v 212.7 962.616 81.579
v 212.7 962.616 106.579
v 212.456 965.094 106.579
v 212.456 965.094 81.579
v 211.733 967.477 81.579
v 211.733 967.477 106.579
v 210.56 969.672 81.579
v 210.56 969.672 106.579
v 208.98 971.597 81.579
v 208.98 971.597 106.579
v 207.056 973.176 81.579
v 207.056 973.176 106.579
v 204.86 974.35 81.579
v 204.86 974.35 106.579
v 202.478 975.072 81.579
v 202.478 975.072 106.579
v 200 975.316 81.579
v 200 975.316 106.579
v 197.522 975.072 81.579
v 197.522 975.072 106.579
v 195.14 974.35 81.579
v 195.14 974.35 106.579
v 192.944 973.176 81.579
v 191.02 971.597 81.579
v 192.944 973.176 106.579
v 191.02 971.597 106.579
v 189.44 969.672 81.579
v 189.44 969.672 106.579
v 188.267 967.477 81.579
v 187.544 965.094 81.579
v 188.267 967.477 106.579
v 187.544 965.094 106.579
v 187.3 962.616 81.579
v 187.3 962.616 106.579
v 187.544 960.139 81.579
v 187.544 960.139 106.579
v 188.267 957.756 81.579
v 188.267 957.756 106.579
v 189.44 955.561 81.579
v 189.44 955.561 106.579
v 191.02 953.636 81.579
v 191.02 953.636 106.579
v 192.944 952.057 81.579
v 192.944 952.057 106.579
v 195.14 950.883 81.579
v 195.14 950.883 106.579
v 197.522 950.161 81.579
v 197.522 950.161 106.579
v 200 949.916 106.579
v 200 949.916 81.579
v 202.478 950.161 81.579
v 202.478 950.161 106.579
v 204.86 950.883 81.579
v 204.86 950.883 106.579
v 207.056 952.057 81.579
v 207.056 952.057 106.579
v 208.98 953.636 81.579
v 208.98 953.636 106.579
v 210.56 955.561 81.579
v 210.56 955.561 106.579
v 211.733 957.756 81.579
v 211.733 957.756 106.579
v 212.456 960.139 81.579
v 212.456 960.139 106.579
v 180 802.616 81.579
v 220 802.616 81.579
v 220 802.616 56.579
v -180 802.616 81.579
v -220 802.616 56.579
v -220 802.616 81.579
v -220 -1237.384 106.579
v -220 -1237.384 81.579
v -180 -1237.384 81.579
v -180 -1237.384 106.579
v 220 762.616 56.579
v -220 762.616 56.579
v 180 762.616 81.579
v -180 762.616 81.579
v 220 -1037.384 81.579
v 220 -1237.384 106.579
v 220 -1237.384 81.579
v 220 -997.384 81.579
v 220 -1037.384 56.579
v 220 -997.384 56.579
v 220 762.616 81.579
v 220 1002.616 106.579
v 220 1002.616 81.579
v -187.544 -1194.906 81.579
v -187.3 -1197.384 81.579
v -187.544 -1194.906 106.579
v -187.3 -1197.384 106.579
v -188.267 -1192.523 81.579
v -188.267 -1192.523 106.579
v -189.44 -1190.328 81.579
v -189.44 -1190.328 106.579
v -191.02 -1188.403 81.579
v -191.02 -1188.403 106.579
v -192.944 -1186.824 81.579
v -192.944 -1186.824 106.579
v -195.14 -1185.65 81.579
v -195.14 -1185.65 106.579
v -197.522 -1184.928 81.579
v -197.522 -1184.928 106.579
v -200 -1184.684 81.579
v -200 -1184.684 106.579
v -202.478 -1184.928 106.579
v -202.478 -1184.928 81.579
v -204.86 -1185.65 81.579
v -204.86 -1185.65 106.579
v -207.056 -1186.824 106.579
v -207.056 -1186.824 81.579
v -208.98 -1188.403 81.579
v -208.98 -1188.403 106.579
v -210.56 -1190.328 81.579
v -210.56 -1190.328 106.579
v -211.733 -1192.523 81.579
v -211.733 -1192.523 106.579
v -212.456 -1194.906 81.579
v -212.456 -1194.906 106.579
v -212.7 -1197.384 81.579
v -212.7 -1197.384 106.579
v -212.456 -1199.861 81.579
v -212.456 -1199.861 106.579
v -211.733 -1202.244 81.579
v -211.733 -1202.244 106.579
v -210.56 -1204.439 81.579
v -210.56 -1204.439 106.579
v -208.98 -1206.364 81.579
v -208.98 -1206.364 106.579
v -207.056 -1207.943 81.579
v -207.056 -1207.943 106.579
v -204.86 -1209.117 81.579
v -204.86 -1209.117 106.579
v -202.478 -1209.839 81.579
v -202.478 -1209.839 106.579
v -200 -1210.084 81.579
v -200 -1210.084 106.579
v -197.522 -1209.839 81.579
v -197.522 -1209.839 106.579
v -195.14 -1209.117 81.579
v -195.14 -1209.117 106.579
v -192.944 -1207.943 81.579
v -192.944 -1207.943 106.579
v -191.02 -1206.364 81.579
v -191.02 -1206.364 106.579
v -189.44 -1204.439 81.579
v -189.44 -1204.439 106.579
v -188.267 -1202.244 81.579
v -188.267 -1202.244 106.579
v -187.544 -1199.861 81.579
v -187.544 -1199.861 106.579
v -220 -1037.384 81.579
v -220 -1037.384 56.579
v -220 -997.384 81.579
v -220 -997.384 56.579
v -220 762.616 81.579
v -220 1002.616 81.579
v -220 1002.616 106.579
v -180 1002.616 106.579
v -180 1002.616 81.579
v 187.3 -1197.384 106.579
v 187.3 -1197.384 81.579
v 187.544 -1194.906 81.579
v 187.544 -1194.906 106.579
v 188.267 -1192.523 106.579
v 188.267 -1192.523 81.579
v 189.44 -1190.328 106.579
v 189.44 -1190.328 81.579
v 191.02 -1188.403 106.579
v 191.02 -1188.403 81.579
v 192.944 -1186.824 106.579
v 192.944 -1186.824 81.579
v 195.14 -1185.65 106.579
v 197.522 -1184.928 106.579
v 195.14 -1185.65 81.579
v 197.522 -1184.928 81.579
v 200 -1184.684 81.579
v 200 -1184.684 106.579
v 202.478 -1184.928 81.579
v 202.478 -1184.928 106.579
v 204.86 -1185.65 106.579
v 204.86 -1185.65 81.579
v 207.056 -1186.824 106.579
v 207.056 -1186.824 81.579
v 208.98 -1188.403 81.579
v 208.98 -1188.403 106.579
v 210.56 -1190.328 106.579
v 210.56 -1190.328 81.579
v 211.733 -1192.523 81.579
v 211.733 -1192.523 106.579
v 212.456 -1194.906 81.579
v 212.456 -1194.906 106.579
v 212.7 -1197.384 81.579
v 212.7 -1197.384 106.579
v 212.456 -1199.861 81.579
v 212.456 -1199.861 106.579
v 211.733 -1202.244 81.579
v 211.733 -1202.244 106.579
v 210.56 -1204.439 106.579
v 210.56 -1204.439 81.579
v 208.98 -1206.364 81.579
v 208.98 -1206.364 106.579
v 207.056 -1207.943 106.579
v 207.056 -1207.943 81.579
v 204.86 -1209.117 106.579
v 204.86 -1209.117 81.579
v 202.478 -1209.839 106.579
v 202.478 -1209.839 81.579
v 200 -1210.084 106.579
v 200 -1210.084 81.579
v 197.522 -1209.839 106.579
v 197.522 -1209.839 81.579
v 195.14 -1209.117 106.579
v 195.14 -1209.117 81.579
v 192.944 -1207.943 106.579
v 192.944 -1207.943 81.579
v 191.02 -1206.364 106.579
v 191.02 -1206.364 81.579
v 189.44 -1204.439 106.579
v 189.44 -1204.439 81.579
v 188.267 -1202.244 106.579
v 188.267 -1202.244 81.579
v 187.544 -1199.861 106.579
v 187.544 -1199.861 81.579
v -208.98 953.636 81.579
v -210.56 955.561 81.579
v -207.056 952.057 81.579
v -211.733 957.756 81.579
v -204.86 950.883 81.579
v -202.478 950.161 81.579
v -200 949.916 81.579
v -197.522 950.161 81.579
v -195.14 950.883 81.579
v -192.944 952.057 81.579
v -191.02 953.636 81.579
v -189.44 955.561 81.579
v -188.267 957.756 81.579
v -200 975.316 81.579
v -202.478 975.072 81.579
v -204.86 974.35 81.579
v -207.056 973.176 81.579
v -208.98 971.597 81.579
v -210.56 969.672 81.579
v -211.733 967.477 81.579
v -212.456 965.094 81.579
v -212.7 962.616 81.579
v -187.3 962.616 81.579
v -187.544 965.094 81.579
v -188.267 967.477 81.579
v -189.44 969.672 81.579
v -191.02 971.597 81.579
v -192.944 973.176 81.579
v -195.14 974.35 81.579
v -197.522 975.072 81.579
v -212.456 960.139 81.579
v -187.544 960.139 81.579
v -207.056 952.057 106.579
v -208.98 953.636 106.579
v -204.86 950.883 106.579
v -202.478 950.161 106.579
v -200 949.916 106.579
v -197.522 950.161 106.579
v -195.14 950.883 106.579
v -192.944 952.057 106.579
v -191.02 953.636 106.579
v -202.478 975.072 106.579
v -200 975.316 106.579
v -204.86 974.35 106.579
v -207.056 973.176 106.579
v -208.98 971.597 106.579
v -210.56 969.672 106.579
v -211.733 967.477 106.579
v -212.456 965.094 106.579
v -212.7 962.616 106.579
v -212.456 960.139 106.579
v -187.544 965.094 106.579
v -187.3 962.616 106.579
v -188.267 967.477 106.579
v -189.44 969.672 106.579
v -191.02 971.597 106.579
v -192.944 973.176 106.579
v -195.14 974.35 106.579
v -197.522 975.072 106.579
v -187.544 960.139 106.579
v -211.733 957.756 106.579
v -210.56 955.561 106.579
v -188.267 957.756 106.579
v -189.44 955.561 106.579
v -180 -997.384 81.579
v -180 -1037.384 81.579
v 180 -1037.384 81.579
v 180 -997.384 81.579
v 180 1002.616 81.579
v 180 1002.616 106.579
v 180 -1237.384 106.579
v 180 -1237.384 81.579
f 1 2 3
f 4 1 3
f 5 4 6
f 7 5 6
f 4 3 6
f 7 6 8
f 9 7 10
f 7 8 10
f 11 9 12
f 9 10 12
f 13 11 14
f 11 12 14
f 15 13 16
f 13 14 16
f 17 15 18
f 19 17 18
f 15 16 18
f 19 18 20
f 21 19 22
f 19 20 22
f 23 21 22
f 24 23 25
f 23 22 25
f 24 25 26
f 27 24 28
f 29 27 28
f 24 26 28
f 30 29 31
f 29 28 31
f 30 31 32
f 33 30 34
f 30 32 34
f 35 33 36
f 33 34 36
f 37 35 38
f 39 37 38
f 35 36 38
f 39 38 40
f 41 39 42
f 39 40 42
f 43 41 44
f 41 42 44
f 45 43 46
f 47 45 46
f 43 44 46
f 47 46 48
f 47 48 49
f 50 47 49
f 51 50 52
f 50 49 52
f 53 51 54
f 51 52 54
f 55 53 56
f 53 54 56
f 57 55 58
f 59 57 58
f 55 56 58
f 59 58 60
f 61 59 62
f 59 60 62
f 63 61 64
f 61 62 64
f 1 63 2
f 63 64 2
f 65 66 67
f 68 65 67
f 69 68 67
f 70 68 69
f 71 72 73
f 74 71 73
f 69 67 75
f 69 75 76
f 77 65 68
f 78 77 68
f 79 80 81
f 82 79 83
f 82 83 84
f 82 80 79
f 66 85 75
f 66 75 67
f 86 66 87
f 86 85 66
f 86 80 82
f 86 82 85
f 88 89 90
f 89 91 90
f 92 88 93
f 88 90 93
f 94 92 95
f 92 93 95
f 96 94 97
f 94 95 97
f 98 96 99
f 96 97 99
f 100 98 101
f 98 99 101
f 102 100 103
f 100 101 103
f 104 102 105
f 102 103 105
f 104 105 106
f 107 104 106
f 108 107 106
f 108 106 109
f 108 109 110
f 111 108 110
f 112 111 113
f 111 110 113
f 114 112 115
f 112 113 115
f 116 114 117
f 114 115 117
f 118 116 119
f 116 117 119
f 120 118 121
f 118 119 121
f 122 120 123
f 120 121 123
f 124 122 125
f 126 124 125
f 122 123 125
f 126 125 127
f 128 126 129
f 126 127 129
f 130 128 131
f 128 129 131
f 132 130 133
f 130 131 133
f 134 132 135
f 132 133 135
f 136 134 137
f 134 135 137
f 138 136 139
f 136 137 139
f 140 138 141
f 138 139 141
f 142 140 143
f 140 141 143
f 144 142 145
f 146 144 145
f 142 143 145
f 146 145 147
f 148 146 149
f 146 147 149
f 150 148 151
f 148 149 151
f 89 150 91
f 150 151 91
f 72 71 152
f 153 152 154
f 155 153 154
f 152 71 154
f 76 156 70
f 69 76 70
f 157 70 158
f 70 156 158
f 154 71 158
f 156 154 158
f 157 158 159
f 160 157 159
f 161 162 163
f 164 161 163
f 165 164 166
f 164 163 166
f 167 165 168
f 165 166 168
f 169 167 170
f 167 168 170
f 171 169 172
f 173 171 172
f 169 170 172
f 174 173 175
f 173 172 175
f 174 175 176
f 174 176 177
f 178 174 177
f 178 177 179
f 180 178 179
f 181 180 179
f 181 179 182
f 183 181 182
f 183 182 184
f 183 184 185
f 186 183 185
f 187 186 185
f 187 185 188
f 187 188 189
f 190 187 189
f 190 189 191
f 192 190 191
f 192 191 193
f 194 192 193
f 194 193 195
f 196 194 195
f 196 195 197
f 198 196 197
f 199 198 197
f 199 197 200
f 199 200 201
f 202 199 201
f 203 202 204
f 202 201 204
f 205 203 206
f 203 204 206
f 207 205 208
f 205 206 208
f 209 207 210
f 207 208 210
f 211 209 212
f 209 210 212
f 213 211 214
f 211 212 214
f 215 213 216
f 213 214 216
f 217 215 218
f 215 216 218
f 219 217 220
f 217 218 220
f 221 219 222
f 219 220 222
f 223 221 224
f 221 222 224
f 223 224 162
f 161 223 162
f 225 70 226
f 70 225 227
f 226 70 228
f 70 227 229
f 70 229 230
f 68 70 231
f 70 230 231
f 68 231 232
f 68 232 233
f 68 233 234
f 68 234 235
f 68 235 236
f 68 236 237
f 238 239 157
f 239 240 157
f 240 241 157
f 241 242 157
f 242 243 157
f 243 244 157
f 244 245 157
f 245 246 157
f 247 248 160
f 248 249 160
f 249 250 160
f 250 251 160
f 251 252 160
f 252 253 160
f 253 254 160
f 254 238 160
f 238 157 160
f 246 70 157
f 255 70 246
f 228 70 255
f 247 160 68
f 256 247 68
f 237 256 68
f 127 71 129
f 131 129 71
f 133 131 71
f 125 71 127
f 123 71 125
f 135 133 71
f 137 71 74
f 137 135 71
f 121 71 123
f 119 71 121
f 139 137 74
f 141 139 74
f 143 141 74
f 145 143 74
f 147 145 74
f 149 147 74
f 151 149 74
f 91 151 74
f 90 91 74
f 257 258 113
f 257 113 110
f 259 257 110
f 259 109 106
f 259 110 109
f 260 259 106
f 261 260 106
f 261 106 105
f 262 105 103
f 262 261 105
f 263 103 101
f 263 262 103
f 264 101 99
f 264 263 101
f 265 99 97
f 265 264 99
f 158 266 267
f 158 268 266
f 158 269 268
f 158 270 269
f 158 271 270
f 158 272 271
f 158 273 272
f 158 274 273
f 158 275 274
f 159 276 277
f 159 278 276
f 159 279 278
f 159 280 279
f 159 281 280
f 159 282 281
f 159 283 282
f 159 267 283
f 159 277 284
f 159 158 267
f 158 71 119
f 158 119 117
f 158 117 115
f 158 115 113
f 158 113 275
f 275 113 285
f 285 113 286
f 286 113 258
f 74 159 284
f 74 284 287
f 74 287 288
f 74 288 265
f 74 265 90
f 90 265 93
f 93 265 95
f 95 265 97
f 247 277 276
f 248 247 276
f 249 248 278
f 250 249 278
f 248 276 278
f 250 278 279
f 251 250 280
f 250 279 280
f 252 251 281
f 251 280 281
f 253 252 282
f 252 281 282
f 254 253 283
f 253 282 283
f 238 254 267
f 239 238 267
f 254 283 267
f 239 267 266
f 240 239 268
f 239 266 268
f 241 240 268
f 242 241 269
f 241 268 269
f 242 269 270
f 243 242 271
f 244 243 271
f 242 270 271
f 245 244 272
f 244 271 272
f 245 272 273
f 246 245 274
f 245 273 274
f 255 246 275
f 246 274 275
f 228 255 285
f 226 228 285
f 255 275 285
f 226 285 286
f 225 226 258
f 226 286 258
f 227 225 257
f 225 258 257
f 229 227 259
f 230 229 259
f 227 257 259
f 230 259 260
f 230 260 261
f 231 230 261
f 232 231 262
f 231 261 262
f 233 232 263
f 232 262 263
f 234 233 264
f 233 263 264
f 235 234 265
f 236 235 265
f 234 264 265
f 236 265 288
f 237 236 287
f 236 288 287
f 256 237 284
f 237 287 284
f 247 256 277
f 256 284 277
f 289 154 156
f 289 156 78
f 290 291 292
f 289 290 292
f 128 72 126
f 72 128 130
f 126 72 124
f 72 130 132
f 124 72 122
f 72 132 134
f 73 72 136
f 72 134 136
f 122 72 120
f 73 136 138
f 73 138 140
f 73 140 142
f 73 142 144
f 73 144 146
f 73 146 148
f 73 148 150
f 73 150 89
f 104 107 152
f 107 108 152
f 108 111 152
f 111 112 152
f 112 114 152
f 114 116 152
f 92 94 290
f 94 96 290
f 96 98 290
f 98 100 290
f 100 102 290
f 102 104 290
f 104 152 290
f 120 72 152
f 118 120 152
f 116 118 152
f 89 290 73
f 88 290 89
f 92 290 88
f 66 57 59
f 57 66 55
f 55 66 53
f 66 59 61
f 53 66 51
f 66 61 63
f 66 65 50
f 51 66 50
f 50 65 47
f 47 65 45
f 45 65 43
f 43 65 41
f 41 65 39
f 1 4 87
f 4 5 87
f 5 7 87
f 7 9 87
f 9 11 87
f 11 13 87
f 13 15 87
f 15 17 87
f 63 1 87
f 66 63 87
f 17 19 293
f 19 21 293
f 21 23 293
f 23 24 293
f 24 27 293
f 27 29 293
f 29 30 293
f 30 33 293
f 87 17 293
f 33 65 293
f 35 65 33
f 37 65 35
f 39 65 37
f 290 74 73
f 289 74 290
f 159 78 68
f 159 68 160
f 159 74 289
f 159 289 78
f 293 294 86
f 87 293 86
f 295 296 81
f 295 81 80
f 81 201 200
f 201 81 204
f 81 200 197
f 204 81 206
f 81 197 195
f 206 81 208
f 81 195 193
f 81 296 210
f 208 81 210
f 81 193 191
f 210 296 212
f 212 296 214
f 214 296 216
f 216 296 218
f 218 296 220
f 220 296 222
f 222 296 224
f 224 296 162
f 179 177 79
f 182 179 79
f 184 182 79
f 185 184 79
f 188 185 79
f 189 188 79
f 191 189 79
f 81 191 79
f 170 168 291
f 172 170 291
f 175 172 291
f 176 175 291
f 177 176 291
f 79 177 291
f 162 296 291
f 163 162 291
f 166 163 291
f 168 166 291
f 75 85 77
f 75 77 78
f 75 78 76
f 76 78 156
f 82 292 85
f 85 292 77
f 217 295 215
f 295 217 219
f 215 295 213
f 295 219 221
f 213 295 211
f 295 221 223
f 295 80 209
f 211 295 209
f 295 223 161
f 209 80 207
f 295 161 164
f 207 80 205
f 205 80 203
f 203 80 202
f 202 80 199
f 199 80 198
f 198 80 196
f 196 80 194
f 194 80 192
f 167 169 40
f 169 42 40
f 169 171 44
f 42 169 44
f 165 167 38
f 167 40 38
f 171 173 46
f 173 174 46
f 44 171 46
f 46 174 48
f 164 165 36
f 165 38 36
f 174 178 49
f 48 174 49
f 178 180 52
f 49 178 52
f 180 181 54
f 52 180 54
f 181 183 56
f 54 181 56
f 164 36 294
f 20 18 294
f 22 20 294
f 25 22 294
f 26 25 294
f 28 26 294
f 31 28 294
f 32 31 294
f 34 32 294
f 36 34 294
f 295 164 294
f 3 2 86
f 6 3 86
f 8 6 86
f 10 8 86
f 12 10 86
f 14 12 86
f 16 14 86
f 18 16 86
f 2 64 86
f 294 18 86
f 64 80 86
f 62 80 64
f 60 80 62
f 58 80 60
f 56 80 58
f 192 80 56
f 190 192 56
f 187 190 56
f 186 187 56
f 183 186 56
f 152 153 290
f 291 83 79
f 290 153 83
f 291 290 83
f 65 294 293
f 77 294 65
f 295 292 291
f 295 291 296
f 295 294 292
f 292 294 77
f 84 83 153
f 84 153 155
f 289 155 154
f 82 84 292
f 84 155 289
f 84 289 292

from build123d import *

# Parameters (mm, degrees)
SKETCH1_W            = 510
SKETCH1_H            = 80
BOSS_EXTRUDE1_DEPTH  = 10
SKETCH2_W            = 70
SKETCH2_H            = 390
CUT_EXTRUDE1_DEPTH   = 11
SKETCH3_W            = 70
SKETCH3_H            = 50
CUT_EXTRUDE2_DEPTH   = 11
SKETCH4_W            = 70
SKETCH4_H            = 10
BOSS_EXTRUDE2_DEPTH  = 100
SKETCH5_W            = 70
SKETCH5_H            = 50
CUT_EXTRUDE3_DEPTH   = 11
SKETCH6_W            = 70
SKETCH6_H            = 10
BOSS_EXTRUDE3_DEPTH  = 100
SKETCH7_W            = 10
SKETCH7_H            = 460
BOSS_EXTRUDE4_DEPTH  = 10
SKETCH8_W            = 10
SKETCH8_H            = 10
BOSS_EXTRUDE5_DEPTH  = 50
SKETCH9_W            = 90
SKETCH9_H            = 60
CUT_EXTRUDE4_DEPTH   = 61
SKETCH10_W           = 90
SKETCH10_H           = 60
CUT_EXTRUDE5_DEPTH   = 61
HOLE1_D              = 6.35
HOLE1_DEPTH          = 10
HOLE2_D              = 6.35
HOLE2_DEPTH          = 80
SCALE1_SCALE         = 4
SKETCH16_W           = 420.354500644
SKETCH16_H           = 2047.440969125
SKETCH16_W_2         = 504.269615058
SKETCH16_H_2         = 2143.883100275
CUT_EXTRUDE6_DEPTH   = 600
SKETCH17_W           = 706.747089412
SKETCH17_H           = 1090.886123918
CUT_EXTRUDE7_DEPTH   = 100
SKETCH18_W           = 40
SKETCH18_H           = 25
BOSS_EXTRUDE6_DEPTH  = 1
SKETCH20_W           = 40
SKETCH20_H           = 1219
SKETCH20_R           = 12.7
BOSS_EXTRUDE9_DEPTH  = 25
SKETCH21_W           = 440
SKETCH21_H           = 40
BOSS_EXTRUDE10_DEPTH = 25


with BuildPart() as part:
    # Sketch1 → Boss-Extrude1 (new body)
    with BuildSketch(Plane(origin=(45, 0, 0), x_dir=(0, -1, 0), z_dir=(-1, 0, 0))):
        with Locations((217.383525535, 40)):
            Rectangle(SKETCH1_W, SKETCH1_H)
    extrude(amount=-BOSS_EXTRUDE1_DEPTH)

    # Sketch2 → Cut-Extrude1 (cut, through all)
    with BuildSketch(Plane.ZY.offset(-45)):
        with Locations((35, -217.383525535)):
            Rectangle(SKETCH2_W, SKETCH2_H)
    extrude(amount=-CUT_EXTRUDE1_DEPTH, mode=Mode.SUBTRACT)

    # Sketch3 → Cut-Extrude2 (cut, through all)
    with BuildSketch(Plane.ZY.offset(-45)):
        with Locations((35, 12.616474465)):
            Rectangle(SKETCH3_W, SKETCH3_H)
    extrude(amount=-CUT_EXTRUDE2_DEPTH, mode=Mode.SUBTRACT)

    # Sketch4 → Boss-Extrude2 (add)
    with BuildSketch(Plane.ZY.offset(-45)):
        with Locations((35, -17.383525535)):
            Rectangle(SKETCH4_W, SKETCH4_H)
    extrude(amount=BOSS_EXTRUDE2_DEPTH)

    # Sketch5 → Cut-Extrude3 (cut, through all)
    with BuildSketch(Plane.ZY.offset(-45)):
        with Locations((35, -447.383525535)):
            Rectangle(SKETCH5_W, SKETCH5_H)
    extrude(amount=-CUT_EXTRUDE3_DEPTH, mode=Mode.SUBTRACT)

    # Sketch6 → Boss-Extrude3 (add)
    with BuildSketch(Plane.ZY.offset(-45)):
        with Locations((35, -417.383525535)):
            Rectangle(SKETCH6_W, SKETCH6_H)
    extrude(amount=BOSS_EXTRUDE3_DEPTH)

    # Sketch7 → Boss-Extrude4 (add)
    with BuildSketch(Plane.XY.offset(70)):
        with Locations((-50, -242.383525535)):
            Rectangle(SKETCH7_W, SKETCH7_H)
    extrude(amount=BOSS_EXTRUDE4_DEPTH)

    # Sketch8 → Boss-Extrude5 (add)
    with BuildSketch(Plane(origin=(0, -12.383525535, 0), x_dir=(-1, 0, 0), z_dir=(0, 1, 0))):
        with Locations((50, 75)):
            Rectangle(SKETCH8_W, SKETCH8_H)
    extrude(amount=BOSS_EXTRUDE5_DEPTH)

    # Sketch9 → Cut-Extrude4 (cut, through all)
    with BuildSketch(Plane.XZ.offset(22.383525535)):
        with Locations((0, 30)):
            Rectangle(SKETCH9_W, SKETCH9_H)
    extrude(amount=-CUT_EXTRUDE4_DEPTH, mode=Mode.SUBTRACT)

    # Sketch10 → Cut-Extrude5 (cut, through all)
    with BuildSketch(Plane(origin=(0, -412.383525535, 0), x_dir=(-1, 0, 0), z_dir=(0, 1, 0))):
        with Locations((0, 30)):
            Rectangle(SKETCH10_W, SKETCH10_H)
    extrude(amount=-CUT_EXTRUDE5_DEPTH, mode=Mode.SUBTRACT)

    # Hole1
    with Locations(Plane(origin=(0, 0, 70), x_dir=(-1, 0, 0), z_dir=(0, 0, -1))):
        with Locations((-50, 27.616474465), (50, -462.383525535)):
            Hole(HOLE1_D / 2, depth=HOLE1_DEPTH)

    # Hole2
    with Locations(Plane.XY.offset(80)):
        with Locations((50, -462.383525535), (-50, 27.616474465)):
            Hole(HOLE2_D / 2, depth=HOLE2_DEPTH)


with BuildPart() as part_1:
    # Scale1: scaled about (0, -217.383525535, 66.140384571)
    add(part.part.scale(SCALE1_SCALE).moved(Location((0, 652.150576605, -198.421153713))))

    # Sketch16 → Cut-Extrude6 (cut)
    with BuildSketch(Plane(origin=(220, 0, 0), x_dir=(0, 0, -1), z_dir=(1, 0, 0))):
        with Locations((153.598404035, -157.332882586)):
            Rectangle(SKETCH16_W, SKETCH16_H)
        with Locations((-358.713653816, -248.900281802)):
            Rectangle(SKETCH16_W_2, SKETCH16_H_2)
    extrude(amount=-CUT_EXTRUDE6_DEPTH, mode=Mode.SUBTRACT)

    # Sketch17 → Cut-Extrude7 (cut)
    with BuildSketch(Plane.XY.offset(106.578846287)):
        with Locations((133.373544706, 328.059536424)):
            Rectangle(SKETCH17_W, SKETCH17_H)
    extrude(amount=-CUT_EXTRUDE7_DEPTH, mode=Mode.SUBTRACT)

    # Sketch18 → Boss-Extrude6 (add)
    with BuildSketch(Plane(origin=(0, -217.383525535, 0), x_dir=(1, 0, 0), z_dir=(0, 1, 0))):
        with Locations((-200, -94.078846287)):
            Rectangle(SKETCH18_W, SKETCH18_H)
        with Locations((200, -94.078846287)):
            Rectangle(SKETCH18_W, SKETCH18_H)
    extrude(amount=BOSS_EXTRUDE6_DEPTH)

    # Sketch20 → Boss-Extrude9 (add)
    with BuildSketch(Plane.XY.offset(106.578846287)):
        with Locations((-200, 393.116474465)):
            Rectangle(SKETCH20_W, SKETCH20_H)
        with Locations((-200, 962.616474465)):
            Circle(SKETCH20_R, mode=Mode.SUBTRACT)
        with Locations((200, 393.116474465)):
            Rectangle(SKETCH20_W, SKETCH20_H)
        with Locations((200, 962.616474465)):
            Circle(SKETCH20_R, mode=Mode.SUBTRACT)
    extrude(amount=-BOSS_EXTRUDE9_DEPTH)

    # Sketch21 → Boss-Extrude10 (add)
    with BuildSketch(Plane(origin=(0, 0, 81.578846287), x_dir=(-1, 0, 0), z_dir=(0, 0, -1))):
        with Locations((0, 782.616474465)):
            Rectangle(SKETCH21_W, SKETCH21_H)
    extrude(amount=BOSS_EXTRUDE10_DEPTH)


solid = part_1.part
